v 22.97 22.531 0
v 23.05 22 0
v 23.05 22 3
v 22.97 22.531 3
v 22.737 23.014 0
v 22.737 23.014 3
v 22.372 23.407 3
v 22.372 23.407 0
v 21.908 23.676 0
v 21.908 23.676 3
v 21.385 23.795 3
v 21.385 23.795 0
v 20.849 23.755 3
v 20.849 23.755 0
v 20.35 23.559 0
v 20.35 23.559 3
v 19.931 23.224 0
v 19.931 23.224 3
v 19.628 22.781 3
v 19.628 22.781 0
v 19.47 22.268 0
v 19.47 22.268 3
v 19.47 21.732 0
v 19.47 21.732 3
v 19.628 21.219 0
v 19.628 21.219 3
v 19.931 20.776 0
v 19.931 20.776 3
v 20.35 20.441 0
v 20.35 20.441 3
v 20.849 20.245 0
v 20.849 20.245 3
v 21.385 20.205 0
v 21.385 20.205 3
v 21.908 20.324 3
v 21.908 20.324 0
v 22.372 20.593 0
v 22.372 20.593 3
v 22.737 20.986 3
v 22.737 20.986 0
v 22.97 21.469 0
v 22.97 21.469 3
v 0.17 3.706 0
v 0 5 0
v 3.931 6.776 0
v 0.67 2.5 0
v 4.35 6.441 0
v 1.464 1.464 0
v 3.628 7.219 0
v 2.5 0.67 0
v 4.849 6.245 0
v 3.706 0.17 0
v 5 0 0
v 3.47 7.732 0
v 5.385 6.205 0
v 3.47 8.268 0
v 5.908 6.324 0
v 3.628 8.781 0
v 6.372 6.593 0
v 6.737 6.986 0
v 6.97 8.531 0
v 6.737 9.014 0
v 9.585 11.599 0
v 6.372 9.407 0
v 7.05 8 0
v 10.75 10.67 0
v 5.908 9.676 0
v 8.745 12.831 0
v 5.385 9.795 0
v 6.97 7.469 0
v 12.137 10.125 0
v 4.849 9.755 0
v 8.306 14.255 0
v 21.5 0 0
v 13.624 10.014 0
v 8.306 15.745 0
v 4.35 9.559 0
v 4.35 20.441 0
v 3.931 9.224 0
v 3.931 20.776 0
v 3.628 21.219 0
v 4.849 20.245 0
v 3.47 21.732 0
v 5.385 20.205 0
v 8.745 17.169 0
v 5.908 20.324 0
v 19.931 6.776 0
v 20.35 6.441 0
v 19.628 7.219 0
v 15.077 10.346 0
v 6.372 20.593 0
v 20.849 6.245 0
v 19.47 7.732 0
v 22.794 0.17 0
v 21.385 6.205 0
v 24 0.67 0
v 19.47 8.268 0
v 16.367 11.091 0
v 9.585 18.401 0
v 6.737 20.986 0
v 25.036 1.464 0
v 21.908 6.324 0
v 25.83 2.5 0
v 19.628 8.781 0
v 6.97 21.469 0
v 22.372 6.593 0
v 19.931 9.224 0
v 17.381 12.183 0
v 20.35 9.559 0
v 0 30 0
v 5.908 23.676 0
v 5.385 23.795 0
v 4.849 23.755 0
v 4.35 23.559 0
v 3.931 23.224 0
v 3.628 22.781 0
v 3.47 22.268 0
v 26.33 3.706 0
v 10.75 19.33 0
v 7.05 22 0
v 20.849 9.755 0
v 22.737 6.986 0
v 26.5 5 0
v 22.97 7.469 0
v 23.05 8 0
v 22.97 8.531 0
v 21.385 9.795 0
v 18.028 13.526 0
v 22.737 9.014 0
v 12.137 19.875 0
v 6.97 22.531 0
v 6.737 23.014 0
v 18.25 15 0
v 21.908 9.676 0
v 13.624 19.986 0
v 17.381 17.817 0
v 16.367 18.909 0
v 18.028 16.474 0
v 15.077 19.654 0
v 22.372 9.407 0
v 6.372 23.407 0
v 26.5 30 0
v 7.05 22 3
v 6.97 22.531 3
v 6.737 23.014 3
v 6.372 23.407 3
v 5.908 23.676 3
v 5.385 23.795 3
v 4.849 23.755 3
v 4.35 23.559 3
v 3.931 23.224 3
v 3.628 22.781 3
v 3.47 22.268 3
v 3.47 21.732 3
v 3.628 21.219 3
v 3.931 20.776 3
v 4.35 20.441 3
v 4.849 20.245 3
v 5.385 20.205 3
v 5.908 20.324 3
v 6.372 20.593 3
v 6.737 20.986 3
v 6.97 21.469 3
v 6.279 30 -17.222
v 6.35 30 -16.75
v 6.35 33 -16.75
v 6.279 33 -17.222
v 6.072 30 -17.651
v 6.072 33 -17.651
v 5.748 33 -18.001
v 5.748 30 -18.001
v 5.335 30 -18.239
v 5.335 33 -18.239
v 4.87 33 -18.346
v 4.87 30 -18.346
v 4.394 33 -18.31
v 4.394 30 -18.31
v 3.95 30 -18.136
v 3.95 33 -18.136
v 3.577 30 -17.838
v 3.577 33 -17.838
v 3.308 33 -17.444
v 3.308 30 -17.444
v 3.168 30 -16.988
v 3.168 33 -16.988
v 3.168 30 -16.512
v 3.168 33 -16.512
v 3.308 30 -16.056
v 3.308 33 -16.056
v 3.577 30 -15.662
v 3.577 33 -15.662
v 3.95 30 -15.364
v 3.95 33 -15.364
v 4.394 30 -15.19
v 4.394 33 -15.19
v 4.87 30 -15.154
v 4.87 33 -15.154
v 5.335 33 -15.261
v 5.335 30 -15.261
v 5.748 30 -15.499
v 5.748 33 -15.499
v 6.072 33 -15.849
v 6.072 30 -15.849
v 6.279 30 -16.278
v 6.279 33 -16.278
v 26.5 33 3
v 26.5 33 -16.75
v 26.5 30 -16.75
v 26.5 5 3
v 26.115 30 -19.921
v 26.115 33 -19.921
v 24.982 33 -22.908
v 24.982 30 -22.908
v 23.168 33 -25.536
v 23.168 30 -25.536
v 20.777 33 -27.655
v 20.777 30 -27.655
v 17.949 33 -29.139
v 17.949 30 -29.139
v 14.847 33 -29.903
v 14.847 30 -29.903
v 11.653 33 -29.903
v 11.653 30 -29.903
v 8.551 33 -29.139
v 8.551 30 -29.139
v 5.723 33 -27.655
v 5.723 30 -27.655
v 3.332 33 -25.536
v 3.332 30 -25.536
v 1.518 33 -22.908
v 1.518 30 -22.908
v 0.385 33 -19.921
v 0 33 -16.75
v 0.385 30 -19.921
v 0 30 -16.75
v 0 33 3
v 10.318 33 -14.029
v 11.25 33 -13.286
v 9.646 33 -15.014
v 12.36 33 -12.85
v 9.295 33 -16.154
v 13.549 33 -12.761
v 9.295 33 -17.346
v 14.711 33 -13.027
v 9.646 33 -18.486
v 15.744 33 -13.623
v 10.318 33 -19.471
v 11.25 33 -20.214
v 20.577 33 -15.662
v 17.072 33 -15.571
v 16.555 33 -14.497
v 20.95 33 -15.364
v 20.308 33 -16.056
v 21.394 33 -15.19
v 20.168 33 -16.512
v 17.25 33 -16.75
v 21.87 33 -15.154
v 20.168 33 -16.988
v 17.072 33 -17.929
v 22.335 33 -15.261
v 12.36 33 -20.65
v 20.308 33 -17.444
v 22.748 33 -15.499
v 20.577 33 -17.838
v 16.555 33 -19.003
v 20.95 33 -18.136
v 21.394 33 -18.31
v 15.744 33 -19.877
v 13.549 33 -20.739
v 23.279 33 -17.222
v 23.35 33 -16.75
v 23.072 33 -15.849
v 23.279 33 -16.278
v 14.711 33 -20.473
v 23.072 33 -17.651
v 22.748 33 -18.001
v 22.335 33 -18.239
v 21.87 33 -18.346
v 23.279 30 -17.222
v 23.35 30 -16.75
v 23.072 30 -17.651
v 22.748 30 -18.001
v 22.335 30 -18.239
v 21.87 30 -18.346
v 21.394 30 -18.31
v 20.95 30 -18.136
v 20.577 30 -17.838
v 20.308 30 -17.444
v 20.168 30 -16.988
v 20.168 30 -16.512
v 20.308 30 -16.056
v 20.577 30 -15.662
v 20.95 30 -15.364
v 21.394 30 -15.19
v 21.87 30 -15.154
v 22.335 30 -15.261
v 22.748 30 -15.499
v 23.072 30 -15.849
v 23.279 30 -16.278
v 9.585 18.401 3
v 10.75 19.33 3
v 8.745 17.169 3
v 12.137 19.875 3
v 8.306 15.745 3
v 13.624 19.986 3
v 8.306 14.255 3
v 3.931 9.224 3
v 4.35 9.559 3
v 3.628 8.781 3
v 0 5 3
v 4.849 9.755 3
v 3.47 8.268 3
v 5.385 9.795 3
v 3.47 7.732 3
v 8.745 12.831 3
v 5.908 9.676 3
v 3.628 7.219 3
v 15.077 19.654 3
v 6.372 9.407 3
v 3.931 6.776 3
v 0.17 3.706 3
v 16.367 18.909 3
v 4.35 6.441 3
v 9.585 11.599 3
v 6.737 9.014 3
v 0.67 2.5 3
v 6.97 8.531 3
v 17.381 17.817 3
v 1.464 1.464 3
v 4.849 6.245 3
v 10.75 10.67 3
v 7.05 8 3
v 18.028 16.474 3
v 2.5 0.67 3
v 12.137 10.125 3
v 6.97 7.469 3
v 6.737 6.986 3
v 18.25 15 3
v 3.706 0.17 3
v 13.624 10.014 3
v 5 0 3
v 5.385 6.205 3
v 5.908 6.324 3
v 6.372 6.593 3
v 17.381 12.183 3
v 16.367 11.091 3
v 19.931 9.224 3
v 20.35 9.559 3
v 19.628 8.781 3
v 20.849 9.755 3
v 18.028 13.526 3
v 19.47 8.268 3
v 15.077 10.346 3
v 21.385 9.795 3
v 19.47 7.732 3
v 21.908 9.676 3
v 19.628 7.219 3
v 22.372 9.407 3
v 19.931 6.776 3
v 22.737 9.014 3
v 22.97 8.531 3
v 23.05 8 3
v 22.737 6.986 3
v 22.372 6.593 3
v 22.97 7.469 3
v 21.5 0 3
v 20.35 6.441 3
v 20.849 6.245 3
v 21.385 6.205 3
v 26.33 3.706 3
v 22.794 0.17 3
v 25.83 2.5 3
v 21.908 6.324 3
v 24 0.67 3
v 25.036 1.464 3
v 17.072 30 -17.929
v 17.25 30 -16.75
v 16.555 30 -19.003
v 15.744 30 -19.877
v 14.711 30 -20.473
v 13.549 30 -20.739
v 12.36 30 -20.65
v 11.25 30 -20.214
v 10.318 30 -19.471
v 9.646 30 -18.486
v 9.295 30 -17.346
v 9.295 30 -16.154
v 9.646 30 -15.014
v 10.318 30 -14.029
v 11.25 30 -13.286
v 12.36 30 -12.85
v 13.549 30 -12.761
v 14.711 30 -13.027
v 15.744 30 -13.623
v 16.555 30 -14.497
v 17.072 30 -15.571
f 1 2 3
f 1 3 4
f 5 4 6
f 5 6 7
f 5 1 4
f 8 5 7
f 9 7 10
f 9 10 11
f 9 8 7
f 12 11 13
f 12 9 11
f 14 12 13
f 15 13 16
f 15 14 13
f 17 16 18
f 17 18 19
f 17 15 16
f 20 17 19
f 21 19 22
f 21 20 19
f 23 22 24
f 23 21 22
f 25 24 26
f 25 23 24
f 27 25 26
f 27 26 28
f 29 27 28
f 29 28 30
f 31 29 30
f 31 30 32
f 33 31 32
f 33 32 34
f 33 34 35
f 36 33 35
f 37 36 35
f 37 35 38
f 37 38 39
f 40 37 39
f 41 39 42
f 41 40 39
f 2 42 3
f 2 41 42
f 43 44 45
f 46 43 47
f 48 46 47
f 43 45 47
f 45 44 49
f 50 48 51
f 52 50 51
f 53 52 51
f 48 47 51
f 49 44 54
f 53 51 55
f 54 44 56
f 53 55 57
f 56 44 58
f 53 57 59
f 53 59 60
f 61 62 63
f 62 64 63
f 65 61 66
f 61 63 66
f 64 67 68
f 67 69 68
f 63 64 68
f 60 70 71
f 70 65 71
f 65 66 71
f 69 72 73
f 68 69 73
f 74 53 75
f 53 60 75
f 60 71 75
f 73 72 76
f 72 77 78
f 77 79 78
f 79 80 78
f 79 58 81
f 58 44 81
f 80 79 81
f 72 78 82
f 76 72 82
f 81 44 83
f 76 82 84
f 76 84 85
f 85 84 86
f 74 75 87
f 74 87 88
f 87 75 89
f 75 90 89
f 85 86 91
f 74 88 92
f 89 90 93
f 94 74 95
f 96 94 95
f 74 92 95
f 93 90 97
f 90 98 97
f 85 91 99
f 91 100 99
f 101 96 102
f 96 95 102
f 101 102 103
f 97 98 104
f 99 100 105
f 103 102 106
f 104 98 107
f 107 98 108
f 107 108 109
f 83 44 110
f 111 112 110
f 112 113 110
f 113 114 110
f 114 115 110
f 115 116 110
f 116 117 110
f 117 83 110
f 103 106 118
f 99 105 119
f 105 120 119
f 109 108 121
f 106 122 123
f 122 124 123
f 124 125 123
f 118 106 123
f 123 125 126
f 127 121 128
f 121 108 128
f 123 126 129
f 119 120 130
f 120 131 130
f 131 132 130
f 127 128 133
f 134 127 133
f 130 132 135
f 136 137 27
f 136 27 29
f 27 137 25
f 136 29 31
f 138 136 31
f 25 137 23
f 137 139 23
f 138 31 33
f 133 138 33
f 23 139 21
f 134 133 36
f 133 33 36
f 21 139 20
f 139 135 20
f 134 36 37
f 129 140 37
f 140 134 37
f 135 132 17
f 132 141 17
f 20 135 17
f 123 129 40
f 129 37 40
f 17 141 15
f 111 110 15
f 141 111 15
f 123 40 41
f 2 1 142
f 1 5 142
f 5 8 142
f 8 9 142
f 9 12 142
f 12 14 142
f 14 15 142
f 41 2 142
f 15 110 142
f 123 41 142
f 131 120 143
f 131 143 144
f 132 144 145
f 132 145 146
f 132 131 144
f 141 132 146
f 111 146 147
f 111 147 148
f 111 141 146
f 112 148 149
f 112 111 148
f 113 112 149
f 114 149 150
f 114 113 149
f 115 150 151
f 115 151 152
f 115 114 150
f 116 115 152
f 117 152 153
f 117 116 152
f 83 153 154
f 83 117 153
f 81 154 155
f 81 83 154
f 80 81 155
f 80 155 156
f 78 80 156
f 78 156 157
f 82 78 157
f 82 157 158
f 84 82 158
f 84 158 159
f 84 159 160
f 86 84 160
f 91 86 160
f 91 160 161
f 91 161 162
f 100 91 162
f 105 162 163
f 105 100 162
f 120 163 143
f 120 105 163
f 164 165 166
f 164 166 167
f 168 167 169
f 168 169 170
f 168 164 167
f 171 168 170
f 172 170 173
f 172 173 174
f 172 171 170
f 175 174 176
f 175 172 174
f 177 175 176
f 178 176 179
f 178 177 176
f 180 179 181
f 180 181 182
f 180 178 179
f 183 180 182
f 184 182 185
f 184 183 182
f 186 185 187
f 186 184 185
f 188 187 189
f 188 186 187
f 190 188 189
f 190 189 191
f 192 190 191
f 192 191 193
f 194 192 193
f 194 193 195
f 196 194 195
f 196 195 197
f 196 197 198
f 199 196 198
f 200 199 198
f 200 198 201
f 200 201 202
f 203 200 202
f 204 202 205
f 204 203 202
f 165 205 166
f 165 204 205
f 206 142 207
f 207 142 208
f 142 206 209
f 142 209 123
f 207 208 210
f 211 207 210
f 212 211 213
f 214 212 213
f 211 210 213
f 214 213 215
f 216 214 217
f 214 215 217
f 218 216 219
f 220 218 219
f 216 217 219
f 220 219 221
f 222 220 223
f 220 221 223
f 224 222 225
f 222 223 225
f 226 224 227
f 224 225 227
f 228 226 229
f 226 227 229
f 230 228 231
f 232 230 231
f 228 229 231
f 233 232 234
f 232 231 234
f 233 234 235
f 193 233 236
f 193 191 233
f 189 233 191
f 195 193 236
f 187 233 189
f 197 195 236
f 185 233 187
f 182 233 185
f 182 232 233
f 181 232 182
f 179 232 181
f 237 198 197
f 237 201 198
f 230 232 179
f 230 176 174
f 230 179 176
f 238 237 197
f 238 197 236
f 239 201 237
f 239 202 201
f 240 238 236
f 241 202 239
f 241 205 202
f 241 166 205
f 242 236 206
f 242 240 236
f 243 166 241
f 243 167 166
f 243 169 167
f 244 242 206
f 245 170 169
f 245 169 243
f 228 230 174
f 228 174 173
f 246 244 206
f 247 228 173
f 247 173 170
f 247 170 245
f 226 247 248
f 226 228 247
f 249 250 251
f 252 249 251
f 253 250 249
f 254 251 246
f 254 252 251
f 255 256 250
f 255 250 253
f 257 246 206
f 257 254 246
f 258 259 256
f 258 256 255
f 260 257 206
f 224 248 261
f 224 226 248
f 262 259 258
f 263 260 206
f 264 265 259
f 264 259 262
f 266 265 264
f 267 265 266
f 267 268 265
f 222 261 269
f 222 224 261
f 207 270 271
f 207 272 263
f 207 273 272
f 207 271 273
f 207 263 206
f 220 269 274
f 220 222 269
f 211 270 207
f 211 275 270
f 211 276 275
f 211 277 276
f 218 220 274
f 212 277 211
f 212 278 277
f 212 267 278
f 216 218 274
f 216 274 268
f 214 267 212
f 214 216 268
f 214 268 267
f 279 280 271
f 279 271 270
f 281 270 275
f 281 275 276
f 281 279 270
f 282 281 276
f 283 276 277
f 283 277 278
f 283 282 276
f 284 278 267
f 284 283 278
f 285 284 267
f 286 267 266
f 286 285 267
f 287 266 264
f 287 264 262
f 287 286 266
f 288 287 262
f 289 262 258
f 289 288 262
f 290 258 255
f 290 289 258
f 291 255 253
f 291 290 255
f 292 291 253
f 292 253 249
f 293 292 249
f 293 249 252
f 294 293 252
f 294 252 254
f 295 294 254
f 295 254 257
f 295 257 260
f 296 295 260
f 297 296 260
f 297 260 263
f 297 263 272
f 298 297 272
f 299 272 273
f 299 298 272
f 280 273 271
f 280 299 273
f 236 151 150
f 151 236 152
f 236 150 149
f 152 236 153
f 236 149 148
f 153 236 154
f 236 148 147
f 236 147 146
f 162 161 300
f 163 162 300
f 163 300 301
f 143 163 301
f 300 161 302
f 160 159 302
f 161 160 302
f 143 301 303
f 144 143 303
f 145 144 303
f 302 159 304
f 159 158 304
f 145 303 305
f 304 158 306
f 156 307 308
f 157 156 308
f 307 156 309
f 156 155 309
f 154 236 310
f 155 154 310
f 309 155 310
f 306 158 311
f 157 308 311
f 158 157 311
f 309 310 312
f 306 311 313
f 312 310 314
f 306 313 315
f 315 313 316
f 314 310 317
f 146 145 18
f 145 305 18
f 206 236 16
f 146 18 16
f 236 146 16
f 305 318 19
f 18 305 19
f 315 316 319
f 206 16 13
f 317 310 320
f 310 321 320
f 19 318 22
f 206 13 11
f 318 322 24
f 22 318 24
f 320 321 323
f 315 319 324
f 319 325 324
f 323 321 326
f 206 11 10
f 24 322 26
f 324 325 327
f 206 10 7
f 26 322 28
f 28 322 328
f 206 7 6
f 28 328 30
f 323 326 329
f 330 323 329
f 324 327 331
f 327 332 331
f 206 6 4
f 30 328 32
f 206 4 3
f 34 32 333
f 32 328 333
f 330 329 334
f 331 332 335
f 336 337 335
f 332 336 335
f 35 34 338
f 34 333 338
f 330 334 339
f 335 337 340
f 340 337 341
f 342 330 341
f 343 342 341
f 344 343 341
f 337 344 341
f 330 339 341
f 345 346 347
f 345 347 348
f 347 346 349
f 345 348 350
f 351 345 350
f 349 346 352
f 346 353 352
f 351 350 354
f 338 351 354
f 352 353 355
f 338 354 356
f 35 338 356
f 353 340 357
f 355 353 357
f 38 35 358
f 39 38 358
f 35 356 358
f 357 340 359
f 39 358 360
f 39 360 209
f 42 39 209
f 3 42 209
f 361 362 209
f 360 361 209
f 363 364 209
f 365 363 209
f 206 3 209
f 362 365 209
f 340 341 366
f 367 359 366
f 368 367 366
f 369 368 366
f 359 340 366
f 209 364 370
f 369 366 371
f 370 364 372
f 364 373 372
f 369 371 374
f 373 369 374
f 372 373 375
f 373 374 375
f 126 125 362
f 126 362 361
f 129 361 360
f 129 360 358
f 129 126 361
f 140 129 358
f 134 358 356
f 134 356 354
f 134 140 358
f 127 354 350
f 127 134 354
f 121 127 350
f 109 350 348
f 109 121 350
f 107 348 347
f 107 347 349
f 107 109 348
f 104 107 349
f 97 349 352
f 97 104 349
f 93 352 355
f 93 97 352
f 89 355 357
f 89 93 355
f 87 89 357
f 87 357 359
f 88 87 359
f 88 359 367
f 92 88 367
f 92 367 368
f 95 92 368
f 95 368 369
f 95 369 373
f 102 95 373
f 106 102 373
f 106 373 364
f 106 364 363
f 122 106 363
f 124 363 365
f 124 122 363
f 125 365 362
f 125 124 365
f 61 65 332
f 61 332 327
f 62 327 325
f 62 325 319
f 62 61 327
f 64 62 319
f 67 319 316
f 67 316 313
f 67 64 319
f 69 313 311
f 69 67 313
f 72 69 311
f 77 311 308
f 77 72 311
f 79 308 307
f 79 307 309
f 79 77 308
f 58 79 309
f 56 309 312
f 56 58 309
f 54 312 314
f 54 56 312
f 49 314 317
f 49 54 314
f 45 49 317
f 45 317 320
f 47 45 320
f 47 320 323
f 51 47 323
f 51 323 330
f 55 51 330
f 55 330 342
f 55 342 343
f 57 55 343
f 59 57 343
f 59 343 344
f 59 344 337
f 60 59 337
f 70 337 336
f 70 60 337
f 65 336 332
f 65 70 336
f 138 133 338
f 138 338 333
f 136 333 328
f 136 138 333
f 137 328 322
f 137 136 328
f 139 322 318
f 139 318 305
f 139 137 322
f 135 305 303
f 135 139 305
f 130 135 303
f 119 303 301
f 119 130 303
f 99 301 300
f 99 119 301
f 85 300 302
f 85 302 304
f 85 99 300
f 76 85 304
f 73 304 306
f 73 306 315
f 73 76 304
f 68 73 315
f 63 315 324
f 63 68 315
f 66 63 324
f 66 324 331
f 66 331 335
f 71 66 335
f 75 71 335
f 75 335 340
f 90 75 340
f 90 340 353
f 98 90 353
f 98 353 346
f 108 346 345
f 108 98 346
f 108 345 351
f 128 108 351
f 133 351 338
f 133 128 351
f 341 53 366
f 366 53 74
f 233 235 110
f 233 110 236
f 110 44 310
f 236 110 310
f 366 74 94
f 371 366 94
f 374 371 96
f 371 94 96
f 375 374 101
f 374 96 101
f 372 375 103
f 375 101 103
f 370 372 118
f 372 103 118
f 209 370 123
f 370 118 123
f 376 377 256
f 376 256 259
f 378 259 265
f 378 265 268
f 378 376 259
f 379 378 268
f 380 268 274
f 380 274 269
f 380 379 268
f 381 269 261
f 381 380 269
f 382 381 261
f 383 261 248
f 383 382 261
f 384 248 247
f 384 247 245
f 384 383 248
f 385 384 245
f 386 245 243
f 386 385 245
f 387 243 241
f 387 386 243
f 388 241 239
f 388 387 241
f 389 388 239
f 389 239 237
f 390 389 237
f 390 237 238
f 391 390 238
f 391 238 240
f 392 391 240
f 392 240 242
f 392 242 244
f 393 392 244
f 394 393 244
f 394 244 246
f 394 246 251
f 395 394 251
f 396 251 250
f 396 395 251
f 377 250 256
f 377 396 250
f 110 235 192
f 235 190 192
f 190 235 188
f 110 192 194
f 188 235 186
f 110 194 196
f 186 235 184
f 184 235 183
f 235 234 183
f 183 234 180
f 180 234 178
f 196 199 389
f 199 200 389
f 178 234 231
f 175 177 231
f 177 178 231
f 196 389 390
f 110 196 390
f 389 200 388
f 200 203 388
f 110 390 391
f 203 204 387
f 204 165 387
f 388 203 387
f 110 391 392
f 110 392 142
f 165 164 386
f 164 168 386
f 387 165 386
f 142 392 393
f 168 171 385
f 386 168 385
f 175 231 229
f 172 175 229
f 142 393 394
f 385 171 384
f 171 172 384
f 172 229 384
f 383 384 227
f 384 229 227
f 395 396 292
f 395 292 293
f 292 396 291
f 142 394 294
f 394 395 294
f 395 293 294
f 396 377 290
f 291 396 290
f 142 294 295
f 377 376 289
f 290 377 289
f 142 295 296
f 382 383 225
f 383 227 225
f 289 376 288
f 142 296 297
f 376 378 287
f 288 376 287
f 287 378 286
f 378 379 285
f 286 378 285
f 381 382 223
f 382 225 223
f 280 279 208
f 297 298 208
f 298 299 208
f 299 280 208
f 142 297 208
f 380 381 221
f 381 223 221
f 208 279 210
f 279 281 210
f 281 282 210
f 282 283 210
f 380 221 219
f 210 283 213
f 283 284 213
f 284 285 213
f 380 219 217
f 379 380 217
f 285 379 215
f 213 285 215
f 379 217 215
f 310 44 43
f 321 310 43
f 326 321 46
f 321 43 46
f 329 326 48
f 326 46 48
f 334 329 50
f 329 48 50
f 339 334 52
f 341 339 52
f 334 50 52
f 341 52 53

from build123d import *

# Parameters (mm, degrees)
SKETCH_1_R      = 5
SKETCH_1_R_2    = 1.8
EXTRUDE_1_DEPTH = 3
SKETCH_3_R      = 4
SKETCH_3_R_2    = 1.6
EXTRUDE_2_DEPTH = 3


with BuildPart() as part:
    # 草图1 → 凸台-拉伸1 (new body)
    with BuildSketch(Plane.XY):
        with BuildLine():
            Line((5, 0), (21.5, 0))
            ThreePointArc((21.5, 0), (25.035533906, 1.464466094), (26.5, 5))
            Line((26.5, 5), (26.5, 30))
            Line((26.5, 30), (0, 30))
            Line((0, 30), (0, 5))
            ThreePointArc((0, 5), (1.464466094, 1.464466094), (5, 0))
        make_face()
        with Locations((13.25, 15)):
            Circle(SKETCH_1_R, mode=Mode.SUBTRACT)
        with Locations((5.25, 8)):
            Circle(SKETCH_1_R_2, mode=Mode.SUBTRACT)
        with Locations((5.25, 22)):
            Circle(SKETCH_1_R_2, mode=Mode.SUBTRACT)
        with Locations((21.25, 8)):
            Circle(SKETCH_1_R_2, mode=Mode.SUBTRACT)
        with Locations((21.25, 22)):
            Circle(SKETCH_1_R_2, mode=Mode.SUBTRACT)
    extrude(amount=EXTRUDE_1_DEPTH)

    # 草图3 → 凸台-拉伸2 (add)
    with BuildSketch(Plane(origin=(0, 30, 0), x_dir=(1, 0, 0), z_dir=(0, 1, 0))):
        with BuildLine():
            Line((0, -3), (26.5, -3))
            Line((26.5, -3), (26.5, 16.75))
            ThreePointArc((26.5, 16.75), (13.25, 30), (0, 16.75))
            Line((0, 16.75), (0, -3))
        make_face()
        with Locations((13.25, 16.75)):
            Circle(SKETCH_3_R, mode=Mode.SUBTRACT)
        with Locations((21.75, 16.75)):
            Circle(SKETCH_3_R_2, mode=Mode.SUBTRACT)
        with Locations((4.75, 16.75)):
            Circle(SKETCH_3_R_2, mode=Mode.SUBTRACT)
    extrude(amount=EXTRUDE_2_DEPTH)


solid = part.part
